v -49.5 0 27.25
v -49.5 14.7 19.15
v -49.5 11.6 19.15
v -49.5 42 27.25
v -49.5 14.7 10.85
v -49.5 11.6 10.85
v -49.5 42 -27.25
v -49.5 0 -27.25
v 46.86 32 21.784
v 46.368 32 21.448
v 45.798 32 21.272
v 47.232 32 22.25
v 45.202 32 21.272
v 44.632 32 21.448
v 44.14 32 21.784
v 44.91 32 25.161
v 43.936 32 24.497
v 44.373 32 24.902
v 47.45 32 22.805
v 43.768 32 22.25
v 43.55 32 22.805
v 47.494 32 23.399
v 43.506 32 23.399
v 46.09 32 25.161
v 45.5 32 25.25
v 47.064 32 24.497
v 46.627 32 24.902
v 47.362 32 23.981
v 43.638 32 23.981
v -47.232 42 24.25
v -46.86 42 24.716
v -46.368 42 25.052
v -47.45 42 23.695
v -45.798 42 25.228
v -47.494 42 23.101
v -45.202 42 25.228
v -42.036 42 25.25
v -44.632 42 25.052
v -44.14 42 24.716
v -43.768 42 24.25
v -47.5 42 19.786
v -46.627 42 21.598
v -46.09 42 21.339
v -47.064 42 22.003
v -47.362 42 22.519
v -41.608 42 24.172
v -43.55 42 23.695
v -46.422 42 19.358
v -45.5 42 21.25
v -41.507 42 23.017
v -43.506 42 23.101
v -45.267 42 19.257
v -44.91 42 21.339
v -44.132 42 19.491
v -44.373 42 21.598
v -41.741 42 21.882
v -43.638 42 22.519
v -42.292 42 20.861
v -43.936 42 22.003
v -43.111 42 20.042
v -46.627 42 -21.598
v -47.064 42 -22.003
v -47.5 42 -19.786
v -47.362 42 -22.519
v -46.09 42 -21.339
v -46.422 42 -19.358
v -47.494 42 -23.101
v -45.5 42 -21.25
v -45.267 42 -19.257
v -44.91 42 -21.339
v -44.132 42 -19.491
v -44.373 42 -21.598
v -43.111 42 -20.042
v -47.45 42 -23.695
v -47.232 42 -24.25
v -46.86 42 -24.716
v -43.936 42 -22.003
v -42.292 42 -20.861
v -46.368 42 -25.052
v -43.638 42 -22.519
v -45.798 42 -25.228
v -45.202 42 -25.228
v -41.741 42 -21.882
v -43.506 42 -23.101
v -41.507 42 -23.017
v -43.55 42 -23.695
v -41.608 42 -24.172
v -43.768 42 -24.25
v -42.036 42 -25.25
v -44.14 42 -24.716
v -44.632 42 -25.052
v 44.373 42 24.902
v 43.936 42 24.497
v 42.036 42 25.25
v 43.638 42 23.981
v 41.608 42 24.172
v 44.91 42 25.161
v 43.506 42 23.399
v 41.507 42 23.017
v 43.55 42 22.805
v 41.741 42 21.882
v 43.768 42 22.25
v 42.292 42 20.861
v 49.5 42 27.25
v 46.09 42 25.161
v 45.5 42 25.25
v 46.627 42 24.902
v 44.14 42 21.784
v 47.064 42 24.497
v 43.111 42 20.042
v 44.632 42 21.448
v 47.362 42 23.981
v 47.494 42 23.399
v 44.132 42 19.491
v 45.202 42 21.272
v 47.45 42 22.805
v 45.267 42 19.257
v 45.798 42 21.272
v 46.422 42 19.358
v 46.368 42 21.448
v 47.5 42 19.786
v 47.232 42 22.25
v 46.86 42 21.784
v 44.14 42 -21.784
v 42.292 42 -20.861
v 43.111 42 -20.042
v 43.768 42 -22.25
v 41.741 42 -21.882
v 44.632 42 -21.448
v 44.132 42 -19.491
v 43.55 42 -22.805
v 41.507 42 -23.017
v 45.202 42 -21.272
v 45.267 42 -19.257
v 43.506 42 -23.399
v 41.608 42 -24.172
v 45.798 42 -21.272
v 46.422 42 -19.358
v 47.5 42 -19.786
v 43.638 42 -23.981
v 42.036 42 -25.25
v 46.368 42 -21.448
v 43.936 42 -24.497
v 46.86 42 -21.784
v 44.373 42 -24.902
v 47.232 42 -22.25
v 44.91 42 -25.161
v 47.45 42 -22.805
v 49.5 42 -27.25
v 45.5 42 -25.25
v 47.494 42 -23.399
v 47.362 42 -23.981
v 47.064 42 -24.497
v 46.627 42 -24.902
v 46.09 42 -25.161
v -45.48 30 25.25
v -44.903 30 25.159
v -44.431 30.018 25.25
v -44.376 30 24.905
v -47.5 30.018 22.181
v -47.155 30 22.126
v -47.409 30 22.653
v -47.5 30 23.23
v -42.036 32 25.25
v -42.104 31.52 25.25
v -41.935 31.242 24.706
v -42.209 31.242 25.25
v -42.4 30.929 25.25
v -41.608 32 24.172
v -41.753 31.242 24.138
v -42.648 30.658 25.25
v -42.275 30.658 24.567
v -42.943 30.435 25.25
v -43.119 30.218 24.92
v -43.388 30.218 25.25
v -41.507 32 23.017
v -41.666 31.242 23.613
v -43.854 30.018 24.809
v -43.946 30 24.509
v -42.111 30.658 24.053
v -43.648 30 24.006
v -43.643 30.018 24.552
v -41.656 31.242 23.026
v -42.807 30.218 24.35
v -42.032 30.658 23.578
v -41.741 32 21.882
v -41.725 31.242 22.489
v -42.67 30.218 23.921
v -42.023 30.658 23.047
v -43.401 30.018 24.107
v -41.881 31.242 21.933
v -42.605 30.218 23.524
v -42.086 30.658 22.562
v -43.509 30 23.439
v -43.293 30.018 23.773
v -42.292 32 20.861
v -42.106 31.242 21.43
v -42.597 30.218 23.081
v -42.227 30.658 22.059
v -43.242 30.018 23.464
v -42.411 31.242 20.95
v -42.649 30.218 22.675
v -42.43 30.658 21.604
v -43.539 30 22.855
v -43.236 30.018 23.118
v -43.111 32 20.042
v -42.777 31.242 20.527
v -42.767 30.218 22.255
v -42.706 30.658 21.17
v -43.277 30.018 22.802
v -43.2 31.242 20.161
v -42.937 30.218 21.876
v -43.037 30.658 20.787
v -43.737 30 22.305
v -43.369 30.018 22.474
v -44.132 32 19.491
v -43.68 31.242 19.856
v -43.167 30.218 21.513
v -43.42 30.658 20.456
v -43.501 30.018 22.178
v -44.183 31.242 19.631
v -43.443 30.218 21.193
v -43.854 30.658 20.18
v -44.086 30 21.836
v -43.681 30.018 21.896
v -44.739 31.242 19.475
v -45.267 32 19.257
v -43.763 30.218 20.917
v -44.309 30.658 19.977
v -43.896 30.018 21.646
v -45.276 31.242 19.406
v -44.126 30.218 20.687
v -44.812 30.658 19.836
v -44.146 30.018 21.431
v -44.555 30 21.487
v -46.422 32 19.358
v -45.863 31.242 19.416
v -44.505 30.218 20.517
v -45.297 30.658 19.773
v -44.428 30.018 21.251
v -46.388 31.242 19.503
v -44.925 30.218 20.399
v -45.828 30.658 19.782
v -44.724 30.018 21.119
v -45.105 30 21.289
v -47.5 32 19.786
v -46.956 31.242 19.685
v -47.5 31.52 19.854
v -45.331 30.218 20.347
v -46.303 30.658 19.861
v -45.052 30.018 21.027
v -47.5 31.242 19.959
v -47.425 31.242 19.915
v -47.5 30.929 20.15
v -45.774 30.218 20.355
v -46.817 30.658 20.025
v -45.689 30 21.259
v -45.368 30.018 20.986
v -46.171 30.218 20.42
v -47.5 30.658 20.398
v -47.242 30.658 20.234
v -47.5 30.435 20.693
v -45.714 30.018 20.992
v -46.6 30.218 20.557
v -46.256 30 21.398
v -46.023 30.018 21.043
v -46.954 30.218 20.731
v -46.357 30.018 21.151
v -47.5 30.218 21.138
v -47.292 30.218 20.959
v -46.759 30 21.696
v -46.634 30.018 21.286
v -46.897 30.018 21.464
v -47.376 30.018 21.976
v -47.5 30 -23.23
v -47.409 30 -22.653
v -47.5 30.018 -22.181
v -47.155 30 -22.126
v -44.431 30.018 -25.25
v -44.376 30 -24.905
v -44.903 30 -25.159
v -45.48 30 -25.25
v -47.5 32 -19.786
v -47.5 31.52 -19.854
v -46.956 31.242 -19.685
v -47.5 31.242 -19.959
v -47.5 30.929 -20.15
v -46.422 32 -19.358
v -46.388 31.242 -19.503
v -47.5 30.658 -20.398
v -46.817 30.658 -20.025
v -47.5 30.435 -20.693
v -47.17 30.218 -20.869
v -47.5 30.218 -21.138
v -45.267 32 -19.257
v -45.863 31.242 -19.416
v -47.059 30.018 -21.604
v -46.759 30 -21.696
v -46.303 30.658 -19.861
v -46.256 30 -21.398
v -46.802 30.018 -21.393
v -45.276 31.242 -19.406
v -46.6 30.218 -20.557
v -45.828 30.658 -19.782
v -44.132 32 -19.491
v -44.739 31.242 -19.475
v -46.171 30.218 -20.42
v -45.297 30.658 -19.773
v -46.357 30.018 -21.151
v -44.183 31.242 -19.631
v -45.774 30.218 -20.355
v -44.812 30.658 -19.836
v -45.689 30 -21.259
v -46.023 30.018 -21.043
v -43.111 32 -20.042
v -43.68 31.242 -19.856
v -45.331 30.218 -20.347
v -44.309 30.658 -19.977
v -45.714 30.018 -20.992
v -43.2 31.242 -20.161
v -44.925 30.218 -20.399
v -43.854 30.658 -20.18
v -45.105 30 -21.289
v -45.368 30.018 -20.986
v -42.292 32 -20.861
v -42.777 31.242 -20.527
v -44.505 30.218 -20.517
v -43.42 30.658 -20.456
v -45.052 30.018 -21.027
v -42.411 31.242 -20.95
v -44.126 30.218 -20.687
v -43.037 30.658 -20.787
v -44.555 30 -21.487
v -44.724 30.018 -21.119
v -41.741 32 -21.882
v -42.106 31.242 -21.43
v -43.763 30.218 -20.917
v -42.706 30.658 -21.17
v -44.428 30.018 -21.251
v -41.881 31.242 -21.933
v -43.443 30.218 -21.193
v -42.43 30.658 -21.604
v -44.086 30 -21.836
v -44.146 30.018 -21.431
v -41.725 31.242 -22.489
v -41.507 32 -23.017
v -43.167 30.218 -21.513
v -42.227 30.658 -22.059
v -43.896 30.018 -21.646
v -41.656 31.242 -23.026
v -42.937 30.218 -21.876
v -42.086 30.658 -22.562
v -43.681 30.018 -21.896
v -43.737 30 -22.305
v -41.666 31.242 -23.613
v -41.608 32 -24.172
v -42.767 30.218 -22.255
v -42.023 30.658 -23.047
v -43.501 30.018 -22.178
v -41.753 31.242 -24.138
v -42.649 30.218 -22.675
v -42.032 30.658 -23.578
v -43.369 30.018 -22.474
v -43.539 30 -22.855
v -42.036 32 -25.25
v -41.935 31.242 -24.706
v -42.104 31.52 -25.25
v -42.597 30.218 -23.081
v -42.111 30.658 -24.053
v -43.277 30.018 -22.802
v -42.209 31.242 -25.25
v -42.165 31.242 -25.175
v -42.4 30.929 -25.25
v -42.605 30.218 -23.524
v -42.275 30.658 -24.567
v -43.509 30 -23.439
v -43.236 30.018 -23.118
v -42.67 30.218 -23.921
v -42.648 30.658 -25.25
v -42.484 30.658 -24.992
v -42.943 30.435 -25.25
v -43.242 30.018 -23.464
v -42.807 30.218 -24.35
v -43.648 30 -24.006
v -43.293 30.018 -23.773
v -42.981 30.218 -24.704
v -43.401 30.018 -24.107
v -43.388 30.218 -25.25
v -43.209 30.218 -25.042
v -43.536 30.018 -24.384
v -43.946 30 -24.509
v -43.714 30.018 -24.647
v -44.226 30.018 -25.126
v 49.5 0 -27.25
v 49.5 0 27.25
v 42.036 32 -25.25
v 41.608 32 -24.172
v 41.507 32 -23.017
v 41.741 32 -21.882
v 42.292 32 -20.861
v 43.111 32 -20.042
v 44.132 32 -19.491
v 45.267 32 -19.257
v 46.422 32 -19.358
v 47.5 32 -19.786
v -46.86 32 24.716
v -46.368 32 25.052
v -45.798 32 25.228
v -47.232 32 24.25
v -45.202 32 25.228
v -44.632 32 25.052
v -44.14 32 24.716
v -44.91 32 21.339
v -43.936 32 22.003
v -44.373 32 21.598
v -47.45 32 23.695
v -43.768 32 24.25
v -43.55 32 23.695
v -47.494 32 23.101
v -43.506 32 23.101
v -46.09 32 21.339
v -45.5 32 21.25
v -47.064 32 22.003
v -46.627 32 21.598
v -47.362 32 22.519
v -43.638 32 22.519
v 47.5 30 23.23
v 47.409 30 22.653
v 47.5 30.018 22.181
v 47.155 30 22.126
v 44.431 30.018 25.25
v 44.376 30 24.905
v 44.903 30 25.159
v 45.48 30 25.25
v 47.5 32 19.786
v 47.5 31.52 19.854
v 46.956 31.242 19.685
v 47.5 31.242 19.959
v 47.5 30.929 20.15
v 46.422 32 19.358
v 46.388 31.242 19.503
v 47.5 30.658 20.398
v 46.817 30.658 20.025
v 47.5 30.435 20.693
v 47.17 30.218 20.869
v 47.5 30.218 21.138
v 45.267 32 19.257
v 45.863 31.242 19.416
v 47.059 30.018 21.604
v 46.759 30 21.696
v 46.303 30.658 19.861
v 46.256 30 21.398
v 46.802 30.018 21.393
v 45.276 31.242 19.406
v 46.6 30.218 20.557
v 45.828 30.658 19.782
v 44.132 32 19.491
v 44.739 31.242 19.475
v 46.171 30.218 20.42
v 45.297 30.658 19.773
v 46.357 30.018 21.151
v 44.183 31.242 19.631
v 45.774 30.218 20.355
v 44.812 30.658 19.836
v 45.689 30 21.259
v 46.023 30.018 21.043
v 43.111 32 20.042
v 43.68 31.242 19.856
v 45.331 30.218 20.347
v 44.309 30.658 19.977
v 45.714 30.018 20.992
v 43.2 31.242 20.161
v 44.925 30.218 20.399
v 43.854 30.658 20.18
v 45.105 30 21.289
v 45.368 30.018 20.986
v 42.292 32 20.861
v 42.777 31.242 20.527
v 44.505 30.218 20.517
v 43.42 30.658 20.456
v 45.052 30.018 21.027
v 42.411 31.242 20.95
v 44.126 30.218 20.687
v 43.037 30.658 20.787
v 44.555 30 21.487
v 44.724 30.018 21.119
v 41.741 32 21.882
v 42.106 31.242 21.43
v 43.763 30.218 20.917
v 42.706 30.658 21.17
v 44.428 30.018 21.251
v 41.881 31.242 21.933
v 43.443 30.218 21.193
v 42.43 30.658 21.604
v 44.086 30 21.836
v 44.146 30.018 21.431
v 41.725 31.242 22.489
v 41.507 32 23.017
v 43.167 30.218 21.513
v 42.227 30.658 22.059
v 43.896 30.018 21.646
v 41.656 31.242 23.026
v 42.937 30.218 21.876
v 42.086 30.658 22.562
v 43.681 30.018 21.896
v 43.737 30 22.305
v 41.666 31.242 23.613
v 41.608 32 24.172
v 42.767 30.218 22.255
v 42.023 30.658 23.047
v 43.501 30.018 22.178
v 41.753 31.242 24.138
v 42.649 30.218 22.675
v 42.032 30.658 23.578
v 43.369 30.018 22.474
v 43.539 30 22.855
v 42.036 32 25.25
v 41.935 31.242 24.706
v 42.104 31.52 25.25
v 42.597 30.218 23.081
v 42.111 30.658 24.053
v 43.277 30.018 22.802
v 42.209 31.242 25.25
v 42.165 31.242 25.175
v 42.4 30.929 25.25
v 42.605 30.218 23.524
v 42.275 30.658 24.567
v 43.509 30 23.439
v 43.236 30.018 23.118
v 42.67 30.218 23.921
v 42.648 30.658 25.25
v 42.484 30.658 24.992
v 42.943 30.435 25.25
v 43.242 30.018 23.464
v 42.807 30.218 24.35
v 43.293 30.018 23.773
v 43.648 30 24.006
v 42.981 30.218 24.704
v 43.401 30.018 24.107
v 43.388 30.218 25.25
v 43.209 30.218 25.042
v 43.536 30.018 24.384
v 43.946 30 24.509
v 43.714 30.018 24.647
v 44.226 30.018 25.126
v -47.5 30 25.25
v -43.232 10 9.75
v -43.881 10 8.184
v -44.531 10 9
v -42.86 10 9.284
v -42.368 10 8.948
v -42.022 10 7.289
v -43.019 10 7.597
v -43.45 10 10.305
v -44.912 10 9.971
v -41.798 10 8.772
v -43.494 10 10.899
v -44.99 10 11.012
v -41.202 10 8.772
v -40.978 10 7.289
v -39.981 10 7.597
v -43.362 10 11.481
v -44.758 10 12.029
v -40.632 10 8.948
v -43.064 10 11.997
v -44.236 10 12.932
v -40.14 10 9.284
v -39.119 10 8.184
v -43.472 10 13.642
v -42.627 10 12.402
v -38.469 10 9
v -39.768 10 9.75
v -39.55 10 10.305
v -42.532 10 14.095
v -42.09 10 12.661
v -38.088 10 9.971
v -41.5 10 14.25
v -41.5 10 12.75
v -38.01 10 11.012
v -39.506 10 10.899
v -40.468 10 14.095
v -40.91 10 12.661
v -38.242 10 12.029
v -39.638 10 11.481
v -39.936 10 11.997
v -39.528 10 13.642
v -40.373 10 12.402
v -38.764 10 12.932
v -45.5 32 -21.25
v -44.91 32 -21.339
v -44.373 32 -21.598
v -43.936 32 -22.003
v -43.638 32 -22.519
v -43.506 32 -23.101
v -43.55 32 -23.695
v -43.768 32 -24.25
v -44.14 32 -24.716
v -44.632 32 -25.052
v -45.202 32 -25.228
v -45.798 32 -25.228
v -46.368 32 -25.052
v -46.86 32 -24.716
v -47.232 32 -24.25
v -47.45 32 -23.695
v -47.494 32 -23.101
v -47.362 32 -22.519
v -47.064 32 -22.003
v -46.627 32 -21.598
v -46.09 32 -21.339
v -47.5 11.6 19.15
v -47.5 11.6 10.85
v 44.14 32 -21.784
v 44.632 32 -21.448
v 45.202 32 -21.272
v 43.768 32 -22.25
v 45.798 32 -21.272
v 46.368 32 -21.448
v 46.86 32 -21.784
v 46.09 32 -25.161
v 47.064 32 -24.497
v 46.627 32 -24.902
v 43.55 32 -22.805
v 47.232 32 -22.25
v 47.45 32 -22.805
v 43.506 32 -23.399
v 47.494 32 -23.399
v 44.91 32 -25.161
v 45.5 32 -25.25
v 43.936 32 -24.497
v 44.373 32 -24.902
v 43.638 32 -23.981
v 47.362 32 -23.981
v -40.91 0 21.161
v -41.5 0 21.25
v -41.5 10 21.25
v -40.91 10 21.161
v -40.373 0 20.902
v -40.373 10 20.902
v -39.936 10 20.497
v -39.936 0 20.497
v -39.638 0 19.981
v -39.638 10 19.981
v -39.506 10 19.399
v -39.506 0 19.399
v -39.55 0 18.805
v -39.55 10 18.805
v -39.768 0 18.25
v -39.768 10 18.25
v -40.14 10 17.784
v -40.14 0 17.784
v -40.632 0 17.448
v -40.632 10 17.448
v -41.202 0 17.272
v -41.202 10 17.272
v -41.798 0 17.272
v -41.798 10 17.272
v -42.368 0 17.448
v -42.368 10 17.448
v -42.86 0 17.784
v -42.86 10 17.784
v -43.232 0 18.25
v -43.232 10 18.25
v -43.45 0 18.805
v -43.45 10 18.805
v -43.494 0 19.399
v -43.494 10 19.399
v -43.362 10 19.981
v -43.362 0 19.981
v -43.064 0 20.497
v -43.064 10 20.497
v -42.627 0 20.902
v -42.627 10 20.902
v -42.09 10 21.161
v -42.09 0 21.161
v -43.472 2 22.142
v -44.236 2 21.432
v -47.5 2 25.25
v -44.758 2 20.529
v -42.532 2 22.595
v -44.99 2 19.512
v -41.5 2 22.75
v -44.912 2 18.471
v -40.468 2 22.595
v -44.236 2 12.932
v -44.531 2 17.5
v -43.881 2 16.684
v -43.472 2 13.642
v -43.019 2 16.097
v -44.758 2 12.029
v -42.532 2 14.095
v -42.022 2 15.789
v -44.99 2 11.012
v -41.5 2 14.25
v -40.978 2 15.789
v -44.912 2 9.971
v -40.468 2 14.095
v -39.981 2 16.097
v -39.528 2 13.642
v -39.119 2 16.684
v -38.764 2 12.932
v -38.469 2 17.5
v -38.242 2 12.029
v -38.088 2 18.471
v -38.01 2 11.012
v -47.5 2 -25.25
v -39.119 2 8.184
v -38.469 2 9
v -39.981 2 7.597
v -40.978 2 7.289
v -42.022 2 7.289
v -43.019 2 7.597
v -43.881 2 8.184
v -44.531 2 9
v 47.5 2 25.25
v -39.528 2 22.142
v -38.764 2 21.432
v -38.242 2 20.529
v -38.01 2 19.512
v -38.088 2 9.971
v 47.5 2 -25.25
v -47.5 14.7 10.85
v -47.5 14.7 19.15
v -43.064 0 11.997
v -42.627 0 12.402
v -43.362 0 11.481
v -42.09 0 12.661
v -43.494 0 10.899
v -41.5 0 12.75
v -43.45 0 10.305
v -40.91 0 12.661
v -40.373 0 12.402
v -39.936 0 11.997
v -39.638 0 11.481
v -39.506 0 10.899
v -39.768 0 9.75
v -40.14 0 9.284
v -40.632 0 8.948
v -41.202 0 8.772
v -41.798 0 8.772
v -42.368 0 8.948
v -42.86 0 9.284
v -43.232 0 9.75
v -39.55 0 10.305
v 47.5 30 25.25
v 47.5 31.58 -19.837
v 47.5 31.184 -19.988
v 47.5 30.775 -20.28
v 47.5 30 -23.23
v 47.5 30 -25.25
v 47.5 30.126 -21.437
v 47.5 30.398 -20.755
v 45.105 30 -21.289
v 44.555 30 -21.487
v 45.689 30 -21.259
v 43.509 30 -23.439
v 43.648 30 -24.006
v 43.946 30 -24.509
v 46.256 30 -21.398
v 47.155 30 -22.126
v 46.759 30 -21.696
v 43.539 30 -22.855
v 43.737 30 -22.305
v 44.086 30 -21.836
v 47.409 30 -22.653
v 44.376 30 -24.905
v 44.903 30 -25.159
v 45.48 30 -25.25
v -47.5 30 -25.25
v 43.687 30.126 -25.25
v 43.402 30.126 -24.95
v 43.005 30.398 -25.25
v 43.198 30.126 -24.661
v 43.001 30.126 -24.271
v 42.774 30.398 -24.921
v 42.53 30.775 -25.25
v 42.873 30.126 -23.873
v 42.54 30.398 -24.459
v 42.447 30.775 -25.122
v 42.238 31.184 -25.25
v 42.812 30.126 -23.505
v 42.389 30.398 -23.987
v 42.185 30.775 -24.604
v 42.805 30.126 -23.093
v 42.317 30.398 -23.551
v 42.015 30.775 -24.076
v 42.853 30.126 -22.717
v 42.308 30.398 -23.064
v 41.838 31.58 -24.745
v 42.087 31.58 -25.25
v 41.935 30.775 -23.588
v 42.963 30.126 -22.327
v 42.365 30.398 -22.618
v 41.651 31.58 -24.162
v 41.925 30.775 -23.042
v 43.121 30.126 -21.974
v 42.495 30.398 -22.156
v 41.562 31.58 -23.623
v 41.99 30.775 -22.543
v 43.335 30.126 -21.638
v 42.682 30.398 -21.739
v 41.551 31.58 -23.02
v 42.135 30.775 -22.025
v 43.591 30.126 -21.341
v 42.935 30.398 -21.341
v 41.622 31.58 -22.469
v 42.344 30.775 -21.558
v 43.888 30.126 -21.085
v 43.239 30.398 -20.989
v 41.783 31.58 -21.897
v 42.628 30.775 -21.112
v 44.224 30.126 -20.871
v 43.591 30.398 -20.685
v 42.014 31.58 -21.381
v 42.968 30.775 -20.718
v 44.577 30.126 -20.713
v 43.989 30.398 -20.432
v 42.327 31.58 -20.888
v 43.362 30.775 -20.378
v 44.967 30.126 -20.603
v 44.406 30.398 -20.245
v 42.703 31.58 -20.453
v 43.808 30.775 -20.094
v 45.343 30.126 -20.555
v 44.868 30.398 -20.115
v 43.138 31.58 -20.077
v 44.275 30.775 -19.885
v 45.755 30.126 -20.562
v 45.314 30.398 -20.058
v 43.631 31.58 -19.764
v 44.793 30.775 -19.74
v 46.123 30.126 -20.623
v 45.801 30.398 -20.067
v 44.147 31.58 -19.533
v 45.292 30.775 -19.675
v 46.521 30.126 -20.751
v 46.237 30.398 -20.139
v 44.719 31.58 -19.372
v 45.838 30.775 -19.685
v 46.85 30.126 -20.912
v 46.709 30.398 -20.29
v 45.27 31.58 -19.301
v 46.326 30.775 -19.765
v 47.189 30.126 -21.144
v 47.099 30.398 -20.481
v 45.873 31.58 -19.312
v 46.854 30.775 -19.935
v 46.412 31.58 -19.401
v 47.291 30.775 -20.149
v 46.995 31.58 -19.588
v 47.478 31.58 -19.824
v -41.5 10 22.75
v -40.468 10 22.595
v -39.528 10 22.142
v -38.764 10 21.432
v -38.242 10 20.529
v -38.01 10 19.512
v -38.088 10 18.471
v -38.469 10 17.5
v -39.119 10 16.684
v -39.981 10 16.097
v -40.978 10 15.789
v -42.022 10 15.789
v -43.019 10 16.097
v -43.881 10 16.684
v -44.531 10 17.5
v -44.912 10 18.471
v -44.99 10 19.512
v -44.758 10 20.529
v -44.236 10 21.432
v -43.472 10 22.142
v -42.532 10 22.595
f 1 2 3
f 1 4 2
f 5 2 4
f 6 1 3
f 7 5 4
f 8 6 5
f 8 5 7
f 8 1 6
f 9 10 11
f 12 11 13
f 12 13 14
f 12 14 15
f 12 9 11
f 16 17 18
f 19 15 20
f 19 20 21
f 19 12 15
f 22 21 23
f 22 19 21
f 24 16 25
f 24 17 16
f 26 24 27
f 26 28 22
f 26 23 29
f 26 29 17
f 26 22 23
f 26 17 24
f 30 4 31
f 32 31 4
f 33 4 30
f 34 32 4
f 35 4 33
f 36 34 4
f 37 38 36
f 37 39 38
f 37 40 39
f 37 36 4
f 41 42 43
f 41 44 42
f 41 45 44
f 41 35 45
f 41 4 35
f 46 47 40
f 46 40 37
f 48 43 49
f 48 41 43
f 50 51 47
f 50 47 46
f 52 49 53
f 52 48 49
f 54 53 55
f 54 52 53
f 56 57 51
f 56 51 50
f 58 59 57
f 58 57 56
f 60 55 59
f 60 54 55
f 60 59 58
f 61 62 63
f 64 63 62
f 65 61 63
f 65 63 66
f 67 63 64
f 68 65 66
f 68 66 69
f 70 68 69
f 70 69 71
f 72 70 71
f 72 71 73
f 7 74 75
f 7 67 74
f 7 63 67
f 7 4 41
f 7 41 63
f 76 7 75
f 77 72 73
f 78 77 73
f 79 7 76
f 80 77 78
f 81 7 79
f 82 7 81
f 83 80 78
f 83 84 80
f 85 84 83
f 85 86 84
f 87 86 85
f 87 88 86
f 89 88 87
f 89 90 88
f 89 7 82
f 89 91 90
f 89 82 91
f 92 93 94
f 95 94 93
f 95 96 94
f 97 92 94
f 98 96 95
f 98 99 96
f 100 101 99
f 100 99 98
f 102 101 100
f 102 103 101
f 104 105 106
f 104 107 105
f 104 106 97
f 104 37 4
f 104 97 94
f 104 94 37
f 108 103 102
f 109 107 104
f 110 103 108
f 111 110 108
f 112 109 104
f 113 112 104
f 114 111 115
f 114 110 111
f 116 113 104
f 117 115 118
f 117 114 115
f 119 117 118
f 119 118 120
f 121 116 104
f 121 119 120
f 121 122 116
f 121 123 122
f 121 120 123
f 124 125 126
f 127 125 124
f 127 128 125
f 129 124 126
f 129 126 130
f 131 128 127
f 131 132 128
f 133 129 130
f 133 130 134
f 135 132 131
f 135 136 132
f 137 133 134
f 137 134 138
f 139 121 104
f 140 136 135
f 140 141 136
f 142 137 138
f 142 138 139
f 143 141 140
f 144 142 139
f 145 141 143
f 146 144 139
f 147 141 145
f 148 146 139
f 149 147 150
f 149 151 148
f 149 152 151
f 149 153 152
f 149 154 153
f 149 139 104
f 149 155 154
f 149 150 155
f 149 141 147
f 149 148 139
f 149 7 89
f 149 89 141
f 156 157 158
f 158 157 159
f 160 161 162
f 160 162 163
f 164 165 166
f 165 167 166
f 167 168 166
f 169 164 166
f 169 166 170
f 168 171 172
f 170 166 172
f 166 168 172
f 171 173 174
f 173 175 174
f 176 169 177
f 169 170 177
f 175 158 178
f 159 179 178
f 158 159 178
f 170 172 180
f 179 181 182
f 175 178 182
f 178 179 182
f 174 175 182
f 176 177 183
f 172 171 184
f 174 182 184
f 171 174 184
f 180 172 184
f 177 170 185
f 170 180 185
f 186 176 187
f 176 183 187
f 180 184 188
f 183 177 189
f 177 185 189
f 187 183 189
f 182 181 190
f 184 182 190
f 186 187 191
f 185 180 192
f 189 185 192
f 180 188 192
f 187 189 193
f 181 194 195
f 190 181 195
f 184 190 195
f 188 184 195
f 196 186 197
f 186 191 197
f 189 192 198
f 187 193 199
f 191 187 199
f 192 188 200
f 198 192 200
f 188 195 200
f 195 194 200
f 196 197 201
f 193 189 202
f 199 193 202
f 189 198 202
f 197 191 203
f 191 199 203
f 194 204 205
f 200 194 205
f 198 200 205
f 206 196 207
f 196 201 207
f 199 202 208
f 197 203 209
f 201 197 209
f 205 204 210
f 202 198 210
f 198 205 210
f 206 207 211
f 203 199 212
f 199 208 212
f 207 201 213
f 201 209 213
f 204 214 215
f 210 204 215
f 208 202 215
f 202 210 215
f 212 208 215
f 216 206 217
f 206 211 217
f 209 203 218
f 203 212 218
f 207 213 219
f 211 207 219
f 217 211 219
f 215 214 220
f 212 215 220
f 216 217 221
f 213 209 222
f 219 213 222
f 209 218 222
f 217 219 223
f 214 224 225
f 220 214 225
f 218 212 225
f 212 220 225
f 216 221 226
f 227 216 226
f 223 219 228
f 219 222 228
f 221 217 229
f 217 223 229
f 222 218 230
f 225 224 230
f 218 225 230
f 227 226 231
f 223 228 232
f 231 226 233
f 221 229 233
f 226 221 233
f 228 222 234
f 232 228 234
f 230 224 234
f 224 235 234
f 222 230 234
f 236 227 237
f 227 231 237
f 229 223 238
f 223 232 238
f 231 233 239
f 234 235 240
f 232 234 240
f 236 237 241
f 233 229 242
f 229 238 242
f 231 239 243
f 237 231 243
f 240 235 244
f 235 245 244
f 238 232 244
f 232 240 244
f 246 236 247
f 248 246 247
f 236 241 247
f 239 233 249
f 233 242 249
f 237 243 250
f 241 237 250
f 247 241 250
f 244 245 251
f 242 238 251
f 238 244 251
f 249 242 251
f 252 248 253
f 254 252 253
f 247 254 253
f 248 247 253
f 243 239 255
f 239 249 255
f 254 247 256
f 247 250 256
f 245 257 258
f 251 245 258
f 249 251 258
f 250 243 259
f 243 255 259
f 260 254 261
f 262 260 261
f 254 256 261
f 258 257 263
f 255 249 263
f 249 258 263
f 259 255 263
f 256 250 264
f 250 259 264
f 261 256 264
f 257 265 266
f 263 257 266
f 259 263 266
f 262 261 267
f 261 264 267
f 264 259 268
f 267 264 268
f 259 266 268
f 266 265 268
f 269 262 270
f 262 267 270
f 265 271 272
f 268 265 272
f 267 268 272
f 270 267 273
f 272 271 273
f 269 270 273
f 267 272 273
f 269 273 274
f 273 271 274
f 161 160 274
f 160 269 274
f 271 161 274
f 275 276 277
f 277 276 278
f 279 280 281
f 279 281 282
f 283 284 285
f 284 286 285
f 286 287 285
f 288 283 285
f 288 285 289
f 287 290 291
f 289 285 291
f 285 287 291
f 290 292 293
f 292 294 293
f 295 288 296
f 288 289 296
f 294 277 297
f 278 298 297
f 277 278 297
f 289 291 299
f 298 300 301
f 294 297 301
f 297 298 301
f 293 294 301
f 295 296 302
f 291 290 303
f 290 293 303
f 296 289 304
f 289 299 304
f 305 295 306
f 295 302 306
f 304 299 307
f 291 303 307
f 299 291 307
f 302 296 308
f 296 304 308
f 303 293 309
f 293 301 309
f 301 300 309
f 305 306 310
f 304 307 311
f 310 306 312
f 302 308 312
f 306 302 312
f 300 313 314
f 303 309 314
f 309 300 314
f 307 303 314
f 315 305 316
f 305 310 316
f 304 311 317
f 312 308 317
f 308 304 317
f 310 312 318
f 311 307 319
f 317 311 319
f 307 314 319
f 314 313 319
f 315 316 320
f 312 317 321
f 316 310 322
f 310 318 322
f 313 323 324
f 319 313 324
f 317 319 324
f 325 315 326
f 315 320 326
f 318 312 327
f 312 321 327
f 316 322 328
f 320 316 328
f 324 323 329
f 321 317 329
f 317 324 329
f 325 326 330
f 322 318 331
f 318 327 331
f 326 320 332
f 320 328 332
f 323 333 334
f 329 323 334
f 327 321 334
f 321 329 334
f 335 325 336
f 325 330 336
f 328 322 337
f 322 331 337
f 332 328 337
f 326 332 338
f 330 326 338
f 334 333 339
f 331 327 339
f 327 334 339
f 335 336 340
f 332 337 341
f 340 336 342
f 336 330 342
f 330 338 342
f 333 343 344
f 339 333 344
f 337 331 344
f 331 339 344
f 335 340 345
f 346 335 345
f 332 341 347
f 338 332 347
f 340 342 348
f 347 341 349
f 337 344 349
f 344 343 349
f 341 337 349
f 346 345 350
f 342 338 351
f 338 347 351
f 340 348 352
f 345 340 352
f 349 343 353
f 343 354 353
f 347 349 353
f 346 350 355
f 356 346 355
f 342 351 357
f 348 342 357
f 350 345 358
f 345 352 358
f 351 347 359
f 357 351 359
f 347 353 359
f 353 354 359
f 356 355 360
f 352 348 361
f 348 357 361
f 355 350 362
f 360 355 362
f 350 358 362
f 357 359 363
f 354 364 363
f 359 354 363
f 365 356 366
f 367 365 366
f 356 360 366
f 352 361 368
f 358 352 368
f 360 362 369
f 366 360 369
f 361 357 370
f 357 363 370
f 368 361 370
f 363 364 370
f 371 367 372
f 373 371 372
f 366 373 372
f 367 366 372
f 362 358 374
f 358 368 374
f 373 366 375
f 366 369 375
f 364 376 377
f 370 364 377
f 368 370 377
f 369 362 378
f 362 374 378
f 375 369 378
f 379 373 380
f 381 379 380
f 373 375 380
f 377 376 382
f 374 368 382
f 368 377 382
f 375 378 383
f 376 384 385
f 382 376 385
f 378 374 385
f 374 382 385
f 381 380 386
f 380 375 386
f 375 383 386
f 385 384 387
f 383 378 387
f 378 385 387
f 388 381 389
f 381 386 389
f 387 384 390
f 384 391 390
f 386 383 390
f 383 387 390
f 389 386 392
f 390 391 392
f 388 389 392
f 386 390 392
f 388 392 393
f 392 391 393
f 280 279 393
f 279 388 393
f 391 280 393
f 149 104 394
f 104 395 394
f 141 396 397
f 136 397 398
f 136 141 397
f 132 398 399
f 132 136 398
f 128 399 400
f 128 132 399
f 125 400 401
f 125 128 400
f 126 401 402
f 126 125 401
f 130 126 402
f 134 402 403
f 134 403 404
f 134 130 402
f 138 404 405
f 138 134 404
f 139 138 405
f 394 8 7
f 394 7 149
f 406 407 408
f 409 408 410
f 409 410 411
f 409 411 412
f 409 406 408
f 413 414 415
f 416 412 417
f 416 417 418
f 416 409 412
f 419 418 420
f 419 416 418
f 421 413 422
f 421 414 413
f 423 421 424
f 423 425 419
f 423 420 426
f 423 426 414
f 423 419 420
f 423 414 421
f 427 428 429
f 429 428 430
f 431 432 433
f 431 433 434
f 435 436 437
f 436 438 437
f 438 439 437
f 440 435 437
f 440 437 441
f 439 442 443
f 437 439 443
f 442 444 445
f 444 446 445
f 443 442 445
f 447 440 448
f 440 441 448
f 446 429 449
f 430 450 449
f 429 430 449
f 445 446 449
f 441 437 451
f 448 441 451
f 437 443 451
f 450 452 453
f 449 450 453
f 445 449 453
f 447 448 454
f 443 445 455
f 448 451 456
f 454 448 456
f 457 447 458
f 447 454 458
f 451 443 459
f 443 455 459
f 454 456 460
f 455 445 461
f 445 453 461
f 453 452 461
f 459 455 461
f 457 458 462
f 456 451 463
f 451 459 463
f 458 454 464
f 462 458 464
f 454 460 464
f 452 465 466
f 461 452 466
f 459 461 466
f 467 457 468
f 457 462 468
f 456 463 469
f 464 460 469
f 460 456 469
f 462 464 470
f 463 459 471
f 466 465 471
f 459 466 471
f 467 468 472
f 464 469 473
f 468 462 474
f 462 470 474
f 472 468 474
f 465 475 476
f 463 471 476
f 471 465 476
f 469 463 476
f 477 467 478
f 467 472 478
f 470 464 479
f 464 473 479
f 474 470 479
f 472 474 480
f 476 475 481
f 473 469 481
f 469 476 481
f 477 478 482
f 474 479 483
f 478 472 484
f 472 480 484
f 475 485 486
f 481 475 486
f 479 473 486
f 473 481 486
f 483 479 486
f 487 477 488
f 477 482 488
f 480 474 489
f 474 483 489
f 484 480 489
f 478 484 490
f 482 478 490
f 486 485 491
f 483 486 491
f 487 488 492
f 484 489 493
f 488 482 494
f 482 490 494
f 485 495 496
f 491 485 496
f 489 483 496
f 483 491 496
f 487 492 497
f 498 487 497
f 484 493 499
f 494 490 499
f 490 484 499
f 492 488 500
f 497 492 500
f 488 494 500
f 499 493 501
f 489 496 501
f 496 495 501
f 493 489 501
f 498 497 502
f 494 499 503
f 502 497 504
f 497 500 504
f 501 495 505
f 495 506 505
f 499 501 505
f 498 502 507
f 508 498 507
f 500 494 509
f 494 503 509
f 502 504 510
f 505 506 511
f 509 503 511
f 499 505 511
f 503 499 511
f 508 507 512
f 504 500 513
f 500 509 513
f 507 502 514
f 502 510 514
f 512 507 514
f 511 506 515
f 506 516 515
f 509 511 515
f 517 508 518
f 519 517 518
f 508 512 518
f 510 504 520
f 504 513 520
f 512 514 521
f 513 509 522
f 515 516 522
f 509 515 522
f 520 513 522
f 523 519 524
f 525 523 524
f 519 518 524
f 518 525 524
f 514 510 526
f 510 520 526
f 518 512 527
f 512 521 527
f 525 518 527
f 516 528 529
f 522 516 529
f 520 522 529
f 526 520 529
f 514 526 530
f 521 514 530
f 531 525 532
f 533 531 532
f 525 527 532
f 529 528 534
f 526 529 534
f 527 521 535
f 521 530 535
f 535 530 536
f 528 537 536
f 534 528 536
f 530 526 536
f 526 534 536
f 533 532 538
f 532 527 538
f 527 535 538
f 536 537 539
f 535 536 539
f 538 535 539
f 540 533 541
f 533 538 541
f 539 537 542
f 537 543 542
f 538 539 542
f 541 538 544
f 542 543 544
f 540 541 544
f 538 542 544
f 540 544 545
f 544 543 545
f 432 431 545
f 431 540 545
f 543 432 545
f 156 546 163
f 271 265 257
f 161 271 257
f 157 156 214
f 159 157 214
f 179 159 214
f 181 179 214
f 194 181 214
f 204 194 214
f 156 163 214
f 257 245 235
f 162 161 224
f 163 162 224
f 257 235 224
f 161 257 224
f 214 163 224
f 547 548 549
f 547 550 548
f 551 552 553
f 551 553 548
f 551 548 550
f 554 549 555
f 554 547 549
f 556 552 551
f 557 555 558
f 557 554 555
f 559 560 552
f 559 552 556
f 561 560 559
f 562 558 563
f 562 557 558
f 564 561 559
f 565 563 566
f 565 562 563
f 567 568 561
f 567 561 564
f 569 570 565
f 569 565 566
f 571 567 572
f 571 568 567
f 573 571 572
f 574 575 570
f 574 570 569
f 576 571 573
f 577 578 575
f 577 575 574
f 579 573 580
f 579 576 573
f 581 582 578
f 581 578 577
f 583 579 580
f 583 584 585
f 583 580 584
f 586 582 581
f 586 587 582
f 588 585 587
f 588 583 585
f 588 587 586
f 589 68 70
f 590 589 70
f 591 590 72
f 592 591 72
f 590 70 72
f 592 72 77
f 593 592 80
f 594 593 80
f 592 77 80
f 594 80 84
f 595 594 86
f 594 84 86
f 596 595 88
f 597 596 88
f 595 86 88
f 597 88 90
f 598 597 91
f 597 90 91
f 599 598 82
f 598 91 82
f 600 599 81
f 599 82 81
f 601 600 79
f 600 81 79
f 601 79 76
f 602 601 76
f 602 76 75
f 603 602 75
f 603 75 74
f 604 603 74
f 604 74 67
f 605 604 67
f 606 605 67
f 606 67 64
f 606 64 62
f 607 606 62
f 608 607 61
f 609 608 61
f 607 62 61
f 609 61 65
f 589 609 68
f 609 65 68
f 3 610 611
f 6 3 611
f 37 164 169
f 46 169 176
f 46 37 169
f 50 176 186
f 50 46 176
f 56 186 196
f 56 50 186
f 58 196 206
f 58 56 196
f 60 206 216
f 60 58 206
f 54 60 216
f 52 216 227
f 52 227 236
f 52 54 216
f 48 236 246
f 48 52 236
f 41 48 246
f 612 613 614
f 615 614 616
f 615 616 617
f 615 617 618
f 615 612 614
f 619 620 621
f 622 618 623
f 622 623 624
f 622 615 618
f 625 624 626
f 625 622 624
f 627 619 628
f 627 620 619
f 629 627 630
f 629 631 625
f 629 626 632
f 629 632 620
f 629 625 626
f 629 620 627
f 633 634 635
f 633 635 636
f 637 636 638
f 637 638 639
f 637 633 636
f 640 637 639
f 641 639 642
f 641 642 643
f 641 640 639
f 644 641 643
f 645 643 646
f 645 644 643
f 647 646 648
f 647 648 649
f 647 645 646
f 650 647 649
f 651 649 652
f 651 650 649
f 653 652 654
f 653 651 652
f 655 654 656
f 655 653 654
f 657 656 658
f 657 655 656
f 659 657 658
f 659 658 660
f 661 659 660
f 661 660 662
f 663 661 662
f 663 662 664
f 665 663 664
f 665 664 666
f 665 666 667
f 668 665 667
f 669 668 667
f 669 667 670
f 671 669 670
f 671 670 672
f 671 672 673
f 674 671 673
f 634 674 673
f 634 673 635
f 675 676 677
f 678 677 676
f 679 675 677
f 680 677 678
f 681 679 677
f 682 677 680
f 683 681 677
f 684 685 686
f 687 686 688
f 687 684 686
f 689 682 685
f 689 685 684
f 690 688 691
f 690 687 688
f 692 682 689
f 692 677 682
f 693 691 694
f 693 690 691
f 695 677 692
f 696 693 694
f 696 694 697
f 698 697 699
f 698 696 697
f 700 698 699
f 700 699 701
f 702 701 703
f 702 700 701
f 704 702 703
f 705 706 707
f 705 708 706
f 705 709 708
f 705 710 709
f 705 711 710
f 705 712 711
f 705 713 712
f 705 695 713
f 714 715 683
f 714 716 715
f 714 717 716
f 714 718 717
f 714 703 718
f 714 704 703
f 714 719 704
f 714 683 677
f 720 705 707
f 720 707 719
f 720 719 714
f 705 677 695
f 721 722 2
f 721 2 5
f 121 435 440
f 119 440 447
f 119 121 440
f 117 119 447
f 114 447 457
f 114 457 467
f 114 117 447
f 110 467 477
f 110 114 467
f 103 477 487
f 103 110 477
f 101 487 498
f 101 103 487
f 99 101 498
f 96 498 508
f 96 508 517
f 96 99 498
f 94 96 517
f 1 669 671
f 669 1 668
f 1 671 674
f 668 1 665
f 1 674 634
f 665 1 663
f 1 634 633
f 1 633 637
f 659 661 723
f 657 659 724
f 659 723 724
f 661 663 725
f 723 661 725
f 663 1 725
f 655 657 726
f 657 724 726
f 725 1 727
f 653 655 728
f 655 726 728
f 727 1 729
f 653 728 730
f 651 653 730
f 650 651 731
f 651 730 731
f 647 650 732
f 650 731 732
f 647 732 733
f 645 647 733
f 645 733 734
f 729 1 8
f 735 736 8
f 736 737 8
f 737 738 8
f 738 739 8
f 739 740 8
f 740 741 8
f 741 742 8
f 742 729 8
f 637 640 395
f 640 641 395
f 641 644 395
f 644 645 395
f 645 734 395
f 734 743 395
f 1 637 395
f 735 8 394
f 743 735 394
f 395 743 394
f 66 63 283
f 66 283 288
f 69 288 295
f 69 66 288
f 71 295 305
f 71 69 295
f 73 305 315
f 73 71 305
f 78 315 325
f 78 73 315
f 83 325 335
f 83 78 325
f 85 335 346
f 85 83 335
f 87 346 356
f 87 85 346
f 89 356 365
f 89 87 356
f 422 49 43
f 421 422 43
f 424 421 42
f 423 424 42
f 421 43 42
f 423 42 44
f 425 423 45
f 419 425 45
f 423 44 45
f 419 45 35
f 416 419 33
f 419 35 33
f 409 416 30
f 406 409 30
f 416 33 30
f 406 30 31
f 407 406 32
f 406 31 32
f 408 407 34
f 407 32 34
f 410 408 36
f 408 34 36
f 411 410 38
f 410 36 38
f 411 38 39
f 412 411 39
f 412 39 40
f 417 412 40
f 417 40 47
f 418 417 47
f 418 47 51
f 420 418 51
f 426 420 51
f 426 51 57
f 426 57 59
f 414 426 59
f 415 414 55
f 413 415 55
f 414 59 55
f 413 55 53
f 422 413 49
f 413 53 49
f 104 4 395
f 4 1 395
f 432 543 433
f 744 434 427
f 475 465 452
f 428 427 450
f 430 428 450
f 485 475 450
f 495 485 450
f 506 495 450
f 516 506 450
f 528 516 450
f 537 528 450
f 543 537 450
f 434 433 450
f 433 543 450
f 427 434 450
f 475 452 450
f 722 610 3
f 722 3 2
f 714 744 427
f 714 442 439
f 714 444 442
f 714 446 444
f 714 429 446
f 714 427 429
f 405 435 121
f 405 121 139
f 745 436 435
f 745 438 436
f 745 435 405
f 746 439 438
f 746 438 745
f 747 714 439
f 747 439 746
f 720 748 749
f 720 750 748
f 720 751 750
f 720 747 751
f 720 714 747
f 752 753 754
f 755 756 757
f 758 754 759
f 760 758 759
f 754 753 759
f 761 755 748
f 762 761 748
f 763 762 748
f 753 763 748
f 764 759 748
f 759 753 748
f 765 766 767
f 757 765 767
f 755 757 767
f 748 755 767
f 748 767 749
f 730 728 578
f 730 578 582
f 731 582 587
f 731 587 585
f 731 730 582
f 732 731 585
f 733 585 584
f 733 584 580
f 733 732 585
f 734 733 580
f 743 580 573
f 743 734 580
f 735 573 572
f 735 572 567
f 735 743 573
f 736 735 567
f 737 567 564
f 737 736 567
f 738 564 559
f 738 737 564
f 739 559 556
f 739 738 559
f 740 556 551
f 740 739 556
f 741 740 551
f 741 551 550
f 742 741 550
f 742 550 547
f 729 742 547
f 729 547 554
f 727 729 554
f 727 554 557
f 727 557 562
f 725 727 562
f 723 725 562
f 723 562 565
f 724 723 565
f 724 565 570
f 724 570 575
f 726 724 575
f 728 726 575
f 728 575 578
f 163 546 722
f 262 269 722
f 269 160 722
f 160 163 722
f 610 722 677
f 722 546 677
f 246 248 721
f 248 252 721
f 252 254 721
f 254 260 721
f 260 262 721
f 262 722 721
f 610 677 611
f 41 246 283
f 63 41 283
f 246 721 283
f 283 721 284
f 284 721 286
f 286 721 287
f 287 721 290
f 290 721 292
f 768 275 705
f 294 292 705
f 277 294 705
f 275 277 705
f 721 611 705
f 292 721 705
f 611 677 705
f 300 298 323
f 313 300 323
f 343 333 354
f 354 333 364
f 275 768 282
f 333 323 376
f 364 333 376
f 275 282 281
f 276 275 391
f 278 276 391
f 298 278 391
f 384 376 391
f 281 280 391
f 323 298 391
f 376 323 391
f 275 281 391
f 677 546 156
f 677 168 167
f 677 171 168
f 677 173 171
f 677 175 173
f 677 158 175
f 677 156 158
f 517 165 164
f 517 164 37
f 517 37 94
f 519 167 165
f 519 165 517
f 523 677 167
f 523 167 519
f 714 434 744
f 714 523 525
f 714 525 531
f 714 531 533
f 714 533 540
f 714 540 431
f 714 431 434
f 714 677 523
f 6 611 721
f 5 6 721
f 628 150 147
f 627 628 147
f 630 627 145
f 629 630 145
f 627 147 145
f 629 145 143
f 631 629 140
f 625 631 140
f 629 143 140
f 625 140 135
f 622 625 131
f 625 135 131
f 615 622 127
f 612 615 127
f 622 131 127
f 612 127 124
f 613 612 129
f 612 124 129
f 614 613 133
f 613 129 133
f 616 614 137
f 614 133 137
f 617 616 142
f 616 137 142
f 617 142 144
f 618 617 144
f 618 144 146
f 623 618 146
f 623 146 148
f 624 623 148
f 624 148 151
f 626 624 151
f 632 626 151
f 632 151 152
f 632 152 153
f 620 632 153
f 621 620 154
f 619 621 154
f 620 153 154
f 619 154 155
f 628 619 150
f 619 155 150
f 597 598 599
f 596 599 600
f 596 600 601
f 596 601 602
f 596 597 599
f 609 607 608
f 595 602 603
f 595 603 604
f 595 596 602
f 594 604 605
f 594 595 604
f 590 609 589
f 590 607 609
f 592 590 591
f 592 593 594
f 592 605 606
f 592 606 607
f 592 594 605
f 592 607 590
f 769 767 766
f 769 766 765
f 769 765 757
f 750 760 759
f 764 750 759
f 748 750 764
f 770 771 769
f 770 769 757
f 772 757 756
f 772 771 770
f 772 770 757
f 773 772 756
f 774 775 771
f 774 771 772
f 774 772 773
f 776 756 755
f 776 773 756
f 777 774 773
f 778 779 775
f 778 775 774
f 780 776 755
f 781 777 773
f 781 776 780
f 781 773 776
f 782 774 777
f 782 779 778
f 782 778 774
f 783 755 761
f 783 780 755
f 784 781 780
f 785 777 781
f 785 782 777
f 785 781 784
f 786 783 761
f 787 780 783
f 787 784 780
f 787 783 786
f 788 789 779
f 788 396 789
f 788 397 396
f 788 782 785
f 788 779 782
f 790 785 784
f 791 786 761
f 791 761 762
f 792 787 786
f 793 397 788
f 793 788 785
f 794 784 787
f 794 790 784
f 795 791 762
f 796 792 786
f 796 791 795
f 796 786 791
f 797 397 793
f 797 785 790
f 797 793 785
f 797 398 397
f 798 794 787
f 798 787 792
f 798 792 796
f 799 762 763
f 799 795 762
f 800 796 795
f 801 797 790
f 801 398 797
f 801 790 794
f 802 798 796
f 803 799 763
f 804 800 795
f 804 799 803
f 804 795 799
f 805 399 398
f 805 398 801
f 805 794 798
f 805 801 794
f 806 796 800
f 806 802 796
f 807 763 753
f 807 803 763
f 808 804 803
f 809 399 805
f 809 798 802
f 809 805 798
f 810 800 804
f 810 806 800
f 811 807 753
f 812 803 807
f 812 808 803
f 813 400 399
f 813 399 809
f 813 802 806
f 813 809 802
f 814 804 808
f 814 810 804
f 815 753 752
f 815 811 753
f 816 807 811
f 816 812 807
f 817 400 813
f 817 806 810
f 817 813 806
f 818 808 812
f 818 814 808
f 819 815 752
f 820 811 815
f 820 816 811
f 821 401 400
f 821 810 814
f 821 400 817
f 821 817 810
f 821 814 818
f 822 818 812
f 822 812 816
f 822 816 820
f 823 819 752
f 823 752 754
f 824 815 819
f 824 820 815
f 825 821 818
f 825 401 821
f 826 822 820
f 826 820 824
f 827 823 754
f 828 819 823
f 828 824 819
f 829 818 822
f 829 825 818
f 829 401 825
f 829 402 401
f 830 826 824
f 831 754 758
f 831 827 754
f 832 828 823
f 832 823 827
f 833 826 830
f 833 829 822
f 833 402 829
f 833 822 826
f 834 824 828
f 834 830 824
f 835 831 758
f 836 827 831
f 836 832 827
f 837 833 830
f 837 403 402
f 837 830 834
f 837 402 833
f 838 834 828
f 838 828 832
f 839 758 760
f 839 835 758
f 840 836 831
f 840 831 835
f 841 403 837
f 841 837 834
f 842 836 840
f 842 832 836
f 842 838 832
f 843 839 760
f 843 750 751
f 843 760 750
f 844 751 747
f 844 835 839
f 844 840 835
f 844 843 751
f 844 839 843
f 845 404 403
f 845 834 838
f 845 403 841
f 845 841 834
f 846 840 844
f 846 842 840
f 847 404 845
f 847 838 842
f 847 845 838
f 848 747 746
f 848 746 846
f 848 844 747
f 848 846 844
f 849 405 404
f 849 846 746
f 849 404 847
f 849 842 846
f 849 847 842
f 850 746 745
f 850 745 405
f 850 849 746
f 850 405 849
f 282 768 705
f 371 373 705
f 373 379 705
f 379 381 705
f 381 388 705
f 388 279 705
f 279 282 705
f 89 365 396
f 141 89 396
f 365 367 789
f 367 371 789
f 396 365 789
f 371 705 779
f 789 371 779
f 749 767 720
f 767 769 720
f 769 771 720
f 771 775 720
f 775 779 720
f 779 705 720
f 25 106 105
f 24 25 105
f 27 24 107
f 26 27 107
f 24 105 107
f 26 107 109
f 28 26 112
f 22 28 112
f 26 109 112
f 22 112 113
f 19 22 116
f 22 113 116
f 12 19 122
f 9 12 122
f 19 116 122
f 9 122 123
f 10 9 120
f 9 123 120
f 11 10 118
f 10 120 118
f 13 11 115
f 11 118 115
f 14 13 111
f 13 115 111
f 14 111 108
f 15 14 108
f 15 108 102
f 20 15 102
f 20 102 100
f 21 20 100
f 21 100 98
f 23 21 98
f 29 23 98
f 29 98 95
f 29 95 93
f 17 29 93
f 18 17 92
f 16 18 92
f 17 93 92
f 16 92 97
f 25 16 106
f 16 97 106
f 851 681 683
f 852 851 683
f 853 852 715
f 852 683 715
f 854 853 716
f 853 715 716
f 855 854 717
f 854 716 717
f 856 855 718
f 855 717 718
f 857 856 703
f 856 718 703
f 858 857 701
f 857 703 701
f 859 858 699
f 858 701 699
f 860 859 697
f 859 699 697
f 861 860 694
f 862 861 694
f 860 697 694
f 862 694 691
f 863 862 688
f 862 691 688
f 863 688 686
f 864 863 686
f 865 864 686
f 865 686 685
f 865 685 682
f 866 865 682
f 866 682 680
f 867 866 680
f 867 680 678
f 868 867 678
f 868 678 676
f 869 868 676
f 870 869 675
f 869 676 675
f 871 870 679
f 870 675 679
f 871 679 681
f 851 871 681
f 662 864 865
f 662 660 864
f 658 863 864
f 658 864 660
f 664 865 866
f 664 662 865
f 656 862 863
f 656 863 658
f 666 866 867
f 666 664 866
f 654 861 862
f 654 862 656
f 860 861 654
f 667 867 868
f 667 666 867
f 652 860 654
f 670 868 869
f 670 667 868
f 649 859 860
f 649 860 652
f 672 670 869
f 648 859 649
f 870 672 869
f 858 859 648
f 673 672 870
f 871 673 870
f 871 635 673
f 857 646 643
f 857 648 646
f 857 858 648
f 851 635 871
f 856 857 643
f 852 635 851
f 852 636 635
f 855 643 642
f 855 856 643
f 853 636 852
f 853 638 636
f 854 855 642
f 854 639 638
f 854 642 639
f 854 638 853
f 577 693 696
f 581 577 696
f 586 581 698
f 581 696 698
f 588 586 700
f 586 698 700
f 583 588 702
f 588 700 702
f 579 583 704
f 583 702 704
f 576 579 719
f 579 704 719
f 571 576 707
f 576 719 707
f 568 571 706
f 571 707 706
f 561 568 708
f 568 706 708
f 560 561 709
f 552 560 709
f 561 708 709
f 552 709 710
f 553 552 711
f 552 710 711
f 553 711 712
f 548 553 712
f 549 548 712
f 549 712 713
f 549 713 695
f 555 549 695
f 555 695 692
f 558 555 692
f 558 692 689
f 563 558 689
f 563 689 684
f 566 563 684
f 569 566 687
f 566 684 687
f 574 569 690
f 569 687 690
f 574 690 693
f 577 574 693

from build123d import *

# Parameters (mm, degrees)
SKETCH1_W           = 99
SKETCH1_H           = 54.5
BOSS_EXTRUDE1_DEPTH = 2
SKETCH2_W           = 99
SKETCH2_H           = 54.5
SKETCH2_W_2         = 95
SKETCH2_H_2         = 50.5
BOSS_EXTRUDE2_DEPTH = 40
SKETCH4_R           = 3.5
SKETCH4_R_2         = 2
BOSS_EXTRUDE3_DEPTH = 8
CUT_EXTRUDE1_START  = -2
SKETCH4_2_R         = 2
CUT_EXTRUDE1_DEPTH  = 2
SKETCH6_W           = 8.3
SKETCH6_H           = 3.1
CUT_EXTRUDE2_DEPTH  = 2
BOSS_EXTRUDE4_DEPTH = 12
SKETCH7_4_R         = 2
CUT_EXTRUDE3_DEPTH  = 10
FILLET1_R           = 2


with BuildPart() as part:
    # Sketch1 → Boss-Extrude1 (new body)
    with BuildSketch(Plane(origin=(0, 0, 0), x_dir=(1, 0, 0), z_dir=(0, 1, 0))):
        Rectangle(SKETCH1_W, SKETCH1_H)
    extrude(amount=BOSS_EXTRUDE1_DEPTH)

    # Sketch2 → Boss-Extrude2 (add)
    with BuildSketch(Plane(origin=(0, 2, 0), x_dir=(1, 0, 0), z_dir=(0, 1, 0))):
        Rectangle(SKETCH2_W, SKETCH2_H)
        Rectangle(SKETCH2_W_2, SKETCH2_H_2, mode=Mode.SUBTRACT)
    extrude(amount=BOSS_EXTRUDE2_DEPTH)

    # Sketch4 → Boss-Extrude3 (add)
    # profile 1 of 2: a face of its own
    with BuildSketch(Plane(origin=(0, 2, 0), x_dir=(1, 0, 0), z_dir=(0, 1, 0))):
        with Locations(Location((-41.5, -19.25, 0), (0, 0, 270))):
            Circle(SKETCH4_R)
        with Locations(Location((-41.5, -19.25, 0), (0, 0, 270))):
            Circle(SKETCH4_R_2, mode=Mode.SUBTRACT)
    # profile 2 of 2: a face of its own
    with BuildSketch(Plane(origin=(0, 2, 0), x_dir=(1, 0, 0), z_dir=(0, 1, 0))):
        with Locations(Location((-41.5, -10.75, 0), (0, 0, 270))):
            Circle(SKETCH4_R)
        with Locations(Location((-41.5, -10.75, 0), (0, 0, 270))):
            Circle(SKETCH4_R_2, mode=Mode.SUBTRACT)
    extrude(amount=BOSS_EXTRUDE3_DEPTH)

    # Sketch4<2> → Cut-Extrude1 (cut)
    with BuildSketch(Plane(origin=(0, 2, 0), x_dir=(1, 0, 0), z_dir=(0, 1, 0)).offset(CUT_EXTRUDE1_START)):
        with Locations(Location((-41.5, -10.75, 0), (0, 0, 270))):
            Circle(SKETCH4_2_R)
        with Locations(Location((-41.5, -19.25, 0), (0, 0, 270))):
            Circle(SKETCH4_2_R)
    extrude(amount=CUT_EXTRUDE1_DEPTH, mode=Mode.SUBTRACT)

    # Sketch6 → Cut-Extrude2 (cut)
    with BuildSketch(Plane(origin=(-47.5, 0, 0), x_dir=(0, 0, -1), z_dir=(1, 0, 0))):
        with Locations((-15, 13.15)):
            Rectangle(SKETCH6_W, SKETCH6_H)
    extrude(amount=-CUT_EXTRUDE2_DEPTH, mode=Mode.SUBTRACT)

    # Sketch7 → Boss-Extrude4 (add)
    with BuildSketch(Plane(origin=(0, 42, 0), x_dir=(1, 0, 0), z_dir=(0, 1, 0))):
        with BuildLine():
            ThreePointArc((-47.5, 19.785898385), (-42.671572875, 20.421572875), (-42.035898385, 25.25))
            Line((-42.035898385, 25.25), (-47.5, 25.25))
            Line((-47.5, 25.25), (-47.5, 19.785898385))
        make_face()
        with BuildLine():
            ThreePointArc((42.035898385, 25.25), (42.671572875, 20.421572875), (47.5, 19.785898385))
            Line((47.5, 19.785898385), (47.5, 25.25))
            Line((47.5, 25.25), (42.035898385, 25.25))
        make_face()
        with BuildLine():
            Line((47.5, -25.25), (47.5, -19.785898385))
            ThreePointArc((47.5, -19.785898385), (42.671572875, -20.421572875), (42.035898385, -25.25))
            Line((42.035898385, -25.25), (47.5, -25.25))
        make_face()
        with BuildLine():
            ThreePointArc((-42.035898385, -25.25), (-42.671572875, -20.421572875), (-47.5, -19.785898385))
            Line((-47.5, -19.785898385), (-47.5, -25.25))
            Line((-47.5, -25.25), (-42.035898385, -25.25))
        make_face()
    extrude(amount=-BOSS_EXTRUDE4_DEPTH)

    # Sketch7<4> → Cut-Extrude3 (cut)
    with BuildSketch(Plane(origin=(0, 42, 0), x_dir=(1, 0, 0), z_dir=(0, 1, 0))):
        with Locations(Location((-45.5, 23.25, 0), (0, 0, 270))):
            Circle(SKETCH7_4_R)
        with Locations(Location((45.5, 23.25, 0), (0, 0, 90))):
            Circle(SKETCH7_4_R)
        with Locations(Location((-45.5, -23.25, 0), (0, 0, 90))):
            Circle(SKETCH7_4_R)
        with Locations(Location((45.5, -23.25, 0), (0, 0, 270))):
            Circle(SKETCH7_4_R)
    extrude(amount=-CUT_EXTRUDE3_DEPTH, mode=Mode.SUBTRACT)

    # Fillet1
    fillet1_edges = [part.edges().sort_by_distance(p)[0] for p in [
        (42.671572875, 30, -20.421572875),
        (-42.671572875, 30, 20.421572875),
        (-42.671572875, 30, -20.421572875),
        (42.671572875, 30, 20.421572875),
    ]]
    fillet(fillet1_edges, radius=FILLET1_R - 0.0001)  # a hair under: the kernel refuses the full size


solid = part.part
